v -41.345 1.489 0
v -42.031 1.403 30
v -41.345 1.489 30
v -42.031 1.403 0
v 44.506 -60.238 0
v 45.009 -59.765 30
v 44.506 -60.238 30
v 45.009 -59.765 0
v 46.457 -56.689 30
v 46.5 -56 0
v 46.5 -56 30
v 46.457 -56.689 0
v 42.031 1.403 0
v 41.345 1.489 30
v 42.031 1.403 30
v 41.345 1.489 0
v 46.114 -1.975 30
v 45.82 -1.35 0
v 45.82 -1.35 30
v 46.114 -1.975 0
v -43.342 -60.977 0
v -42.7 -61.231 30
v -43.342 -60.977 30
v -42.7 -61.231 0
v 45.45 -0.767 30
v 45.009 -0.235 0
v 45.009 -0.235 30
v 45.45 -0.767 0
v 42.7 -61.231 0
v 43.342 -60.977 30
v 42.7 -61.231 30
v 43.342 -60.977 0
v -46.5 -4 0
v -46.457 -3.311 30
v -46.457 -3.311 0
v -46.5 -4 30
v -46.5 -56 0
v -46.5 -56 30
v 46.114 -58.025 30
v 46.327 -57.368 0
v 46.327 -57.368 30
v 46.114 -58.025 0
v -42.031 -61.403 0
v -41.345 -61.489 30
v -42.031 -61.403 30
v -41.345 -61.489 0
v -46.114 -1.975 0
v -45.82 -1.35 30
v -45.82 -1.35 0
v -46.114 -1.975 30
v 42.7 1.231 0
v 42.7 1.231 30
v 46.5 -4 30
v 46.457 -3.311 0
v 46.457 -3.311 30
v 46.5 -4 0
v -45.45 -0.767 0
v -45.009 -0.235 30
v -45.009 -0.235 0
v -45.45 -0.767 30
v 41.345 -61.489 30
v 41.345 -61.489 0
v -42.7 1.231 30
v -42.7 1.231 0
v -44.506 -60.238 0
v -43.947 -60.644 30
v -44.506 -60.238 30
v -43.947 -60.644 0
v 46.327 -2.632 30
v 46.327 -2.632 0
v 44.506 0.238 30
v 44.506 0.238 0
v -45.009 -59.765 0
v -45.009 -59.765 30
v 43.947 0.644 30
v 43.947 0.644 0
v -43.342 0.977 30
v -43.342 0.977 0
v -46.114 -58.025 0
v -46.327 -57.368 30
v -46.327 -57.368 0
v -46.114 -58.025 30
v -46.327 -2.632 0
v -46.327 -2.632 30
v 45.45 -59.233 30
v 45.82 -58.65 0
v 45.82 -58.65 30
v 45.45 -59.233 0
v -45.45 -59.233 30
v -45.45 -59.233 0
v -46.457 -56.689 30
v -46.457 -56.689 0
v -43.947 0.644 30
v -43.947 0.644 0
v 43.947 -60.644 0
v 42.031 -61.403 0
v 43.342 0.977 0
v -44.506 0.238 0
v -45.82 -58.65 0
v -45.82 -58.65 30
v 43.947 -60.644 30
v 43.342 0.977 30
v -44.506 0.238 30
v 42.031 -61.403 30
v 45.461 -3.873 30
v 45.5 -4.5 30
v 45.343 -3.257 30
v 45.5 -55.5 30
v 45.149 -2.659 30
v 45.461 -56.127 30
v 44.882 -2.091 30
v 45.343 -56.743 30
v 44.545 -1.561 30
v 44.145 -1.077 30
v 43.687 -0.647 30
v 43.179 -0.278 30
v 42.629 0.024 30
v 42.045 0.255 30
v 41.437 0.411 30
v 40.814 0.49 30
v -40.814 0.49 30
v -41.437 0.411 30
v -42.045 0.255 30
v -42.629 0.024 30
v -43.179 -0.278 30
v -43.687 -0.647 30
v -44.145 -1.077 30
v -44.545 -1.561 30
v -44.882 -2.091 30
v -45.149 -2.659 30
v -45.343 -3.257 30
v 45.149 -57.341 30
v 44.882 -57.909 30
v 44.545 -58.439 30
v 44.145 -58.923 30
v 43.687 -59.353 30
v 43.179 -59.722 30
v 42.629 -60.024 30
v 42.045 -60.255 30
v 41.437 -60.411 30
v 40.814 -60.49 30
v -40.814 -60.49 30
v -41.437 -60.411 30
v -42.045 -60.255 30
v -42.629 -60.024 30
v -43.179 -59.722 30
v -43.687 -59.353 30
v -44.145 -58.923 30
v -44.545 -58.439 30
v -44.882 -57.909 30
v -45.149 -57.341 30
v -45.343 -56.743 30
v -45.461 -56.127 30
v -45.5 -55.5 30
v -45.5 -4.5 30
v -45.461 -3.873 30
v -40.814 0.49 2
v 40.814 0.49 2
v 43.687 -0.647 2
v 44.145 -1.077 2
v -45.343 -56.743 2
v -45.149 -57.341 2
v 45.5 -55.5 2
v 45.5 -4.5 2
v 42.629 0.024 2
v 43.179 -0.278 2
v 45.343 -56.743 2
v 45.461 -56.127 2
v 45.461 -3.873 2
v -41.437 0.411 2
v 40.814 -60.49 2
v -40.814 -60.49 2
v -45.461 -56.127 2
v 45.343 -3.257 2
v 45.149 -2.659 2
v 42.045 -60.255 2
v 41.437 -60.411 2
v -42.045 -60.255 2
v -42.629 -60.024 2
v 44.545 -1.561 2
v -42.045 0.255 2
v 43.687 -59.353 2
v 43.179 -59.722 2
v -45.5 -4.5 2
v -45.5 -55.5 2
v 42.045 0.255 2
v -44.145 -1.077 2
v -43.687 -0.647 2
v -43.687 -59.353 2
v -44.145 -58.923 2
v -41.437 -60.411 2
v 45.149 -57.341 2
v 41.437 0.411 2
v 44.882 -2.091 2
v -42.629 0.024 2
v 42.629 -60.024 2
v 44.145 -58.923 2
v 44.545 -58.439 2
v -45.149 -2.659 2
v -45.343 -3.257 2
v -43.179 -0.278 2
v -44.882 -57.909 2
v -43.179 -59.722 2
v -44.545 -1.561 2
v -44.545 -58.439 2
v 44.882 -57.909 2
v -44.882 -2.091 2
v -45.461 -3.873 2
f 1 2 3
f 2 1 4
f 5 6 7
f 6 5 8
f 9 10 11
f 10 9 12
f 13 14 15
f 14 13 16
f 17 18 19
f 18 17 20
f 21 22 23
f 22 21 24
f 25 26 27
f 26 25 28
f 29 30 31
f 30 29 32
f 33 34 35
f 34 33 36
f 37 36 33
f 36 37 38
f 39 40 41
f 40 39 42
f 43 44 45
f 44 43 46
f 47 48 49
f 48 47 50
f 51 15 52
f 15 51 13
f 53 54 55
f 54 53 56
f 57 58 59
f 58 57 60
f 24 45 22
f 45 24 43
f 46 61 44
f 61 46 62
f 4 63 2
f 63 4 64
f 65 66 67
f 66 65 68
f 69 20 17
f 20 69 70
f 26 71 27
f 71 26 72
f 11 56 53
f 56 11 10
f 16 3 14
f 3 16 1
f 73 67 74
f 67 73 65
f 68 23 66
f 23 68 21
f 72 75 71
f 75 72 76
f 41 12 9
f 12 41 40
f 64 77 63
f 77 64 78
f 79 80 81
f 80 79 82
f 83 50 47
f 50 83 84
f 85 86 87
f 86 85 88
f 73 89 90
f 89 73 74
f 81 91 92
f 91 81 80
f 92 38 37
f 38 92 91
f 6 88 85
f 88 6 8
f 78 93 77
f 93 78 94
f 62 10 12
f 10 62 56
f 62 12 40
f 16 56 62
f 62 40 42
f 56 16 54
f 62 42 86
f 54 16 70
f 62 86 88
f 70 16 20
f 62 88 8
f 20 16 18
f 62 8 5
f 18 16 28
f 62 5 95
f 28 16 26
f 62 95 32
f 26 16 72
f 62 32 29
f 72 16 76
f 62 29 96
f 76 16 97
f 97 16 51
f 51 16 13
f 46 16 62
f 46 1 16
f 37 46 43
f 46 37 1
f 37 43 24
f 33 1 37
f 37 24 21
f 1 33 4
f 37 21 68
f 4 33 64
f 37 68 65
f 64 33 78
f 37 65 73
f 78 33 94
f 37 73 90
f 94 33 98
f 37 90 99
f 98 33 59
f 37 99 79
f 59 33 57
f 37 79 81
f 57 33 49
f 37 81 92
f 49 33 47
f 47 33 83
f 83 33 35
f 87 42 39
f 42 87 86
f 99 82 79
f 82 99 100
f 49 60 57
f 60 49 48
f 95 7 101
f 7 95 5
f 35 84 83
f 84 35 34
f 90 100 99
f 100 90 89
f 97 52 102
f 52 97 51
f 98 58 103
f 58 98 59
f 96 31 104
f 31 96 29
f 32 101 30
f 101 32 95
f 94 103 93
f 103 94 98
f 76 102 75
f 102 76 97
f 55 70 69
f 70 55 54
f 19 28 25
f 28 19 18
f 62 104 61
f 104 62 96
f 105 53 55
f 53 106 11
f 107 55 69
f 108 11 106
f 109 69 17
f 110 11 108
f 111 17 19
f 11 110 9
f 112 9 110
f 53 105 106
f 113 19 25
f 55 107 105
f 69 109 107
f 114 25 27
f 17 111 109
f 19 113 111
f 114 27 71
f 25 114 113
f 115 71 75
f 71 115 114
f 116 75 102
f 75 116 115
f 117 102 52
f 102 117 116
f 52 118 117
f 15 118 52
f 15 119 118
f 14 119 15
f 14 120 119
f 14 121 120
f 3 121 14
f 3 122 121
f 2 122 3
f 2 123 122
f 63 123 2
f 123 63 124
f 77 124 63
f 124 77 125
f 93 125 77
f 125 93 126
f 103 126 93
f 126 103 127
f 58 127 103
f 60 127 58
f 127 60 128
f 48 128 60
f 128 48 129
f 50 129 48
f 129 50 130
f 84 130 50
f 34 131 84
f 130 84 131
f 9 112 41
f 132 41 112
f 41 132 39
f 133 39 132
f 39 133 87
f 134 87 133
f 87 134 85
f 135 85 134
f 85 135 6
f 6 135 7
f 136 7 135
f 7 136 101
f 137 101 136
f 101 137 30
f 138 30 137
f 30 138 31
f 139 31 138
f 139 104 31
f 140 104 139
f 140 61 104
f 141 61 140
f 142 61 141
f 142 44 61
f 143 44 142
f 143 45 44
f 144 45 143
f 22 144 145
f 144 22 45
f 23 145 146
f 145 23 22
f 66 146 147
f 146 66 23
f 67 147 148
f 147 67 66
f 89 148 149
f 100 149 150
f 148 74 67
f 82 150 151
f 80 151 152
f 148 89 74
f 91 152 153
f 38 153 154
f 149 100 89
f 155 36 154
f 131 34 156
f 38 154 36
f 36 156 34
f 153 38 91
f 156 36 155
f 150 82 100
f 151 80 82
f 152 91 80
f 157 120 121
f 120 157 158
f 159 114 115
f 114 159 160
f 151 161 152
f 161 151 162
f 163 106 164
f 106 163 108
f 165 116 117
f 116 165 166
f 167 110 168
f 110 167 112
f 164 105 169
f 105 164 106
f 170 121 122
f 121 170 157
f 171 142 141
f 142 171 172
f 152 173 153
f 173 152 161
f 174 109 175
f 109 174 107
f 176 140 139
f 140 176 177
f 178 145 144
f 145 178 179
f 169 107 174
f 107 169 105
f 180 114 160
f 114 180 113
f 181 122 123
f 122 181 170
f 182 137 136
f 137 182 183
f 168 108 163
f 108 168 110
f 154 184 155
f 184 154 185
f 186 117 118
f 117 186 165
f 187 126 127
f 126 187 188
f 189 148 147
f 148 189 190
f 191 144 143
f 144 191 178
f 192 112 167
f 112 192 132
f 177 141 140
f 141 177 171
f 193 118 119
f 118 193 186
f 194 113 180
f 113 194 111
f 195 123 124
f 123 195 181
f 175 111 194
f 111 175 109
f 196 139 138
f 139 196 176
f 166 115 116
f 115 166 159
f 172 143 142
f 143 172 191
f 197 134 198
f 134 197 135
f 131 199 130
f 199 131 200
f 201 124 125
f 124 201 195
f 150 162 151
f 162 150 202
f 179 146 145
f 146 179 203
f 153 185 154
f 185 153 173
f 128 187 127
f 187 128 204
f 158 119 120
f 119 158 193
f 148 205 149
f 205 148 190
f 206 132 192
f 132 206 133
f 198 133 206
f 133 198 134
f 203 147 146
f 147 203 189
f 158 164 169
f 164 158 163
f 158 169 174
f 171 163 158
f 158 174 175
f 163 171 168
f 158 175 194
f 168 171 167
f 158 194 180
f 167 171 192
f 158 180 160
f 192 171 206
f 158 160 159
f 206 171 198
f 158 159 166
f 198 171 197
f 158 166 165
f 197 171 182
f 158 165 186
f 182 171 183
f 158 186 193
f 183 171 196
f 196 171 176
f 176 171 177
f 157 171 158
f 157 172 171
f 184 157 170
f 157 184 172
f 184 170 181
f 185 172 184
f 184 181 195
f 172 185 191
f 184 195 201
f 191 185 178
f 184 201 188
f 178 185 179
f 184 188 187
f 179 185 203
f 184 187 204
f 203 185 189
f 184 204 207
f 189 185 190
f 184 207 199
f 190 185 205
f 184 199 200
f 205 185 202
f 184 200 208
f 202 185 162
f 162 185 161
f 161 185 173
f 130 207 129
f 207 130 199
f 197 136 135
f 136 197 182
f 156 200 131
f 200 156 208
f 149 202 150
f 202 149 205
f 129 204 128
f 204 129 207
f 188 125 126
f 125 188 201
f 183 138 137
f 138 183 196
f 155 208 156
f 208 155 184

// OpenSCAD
$fn = 50;


difference() {
	union() {
		translate(v = [0, -30.0000000000, 0]) {
			hull() {
				translate(v = [-41.0000000000, 26.0000000000, 0]) {
					cylinder(h = 30, r = 5.5000000000);
				}
				translate(v = [41.0000000000, 26.0000000000, 0]) {
					cylinder(h = 30, r = 5.5000000000);
				}
				translate(v = [-41.0000000000, -26.0000000000, 0]) {
					cylinder(h = 30, r = 5.5000000000);
				}
				translate(v = [41.0000000000, -26.0000000000, 0]) {
					cylinder(h = 30, r = 5.5000000000);
				}
			}
		}
	}
	union() {
		translate(v = [0, -30.0000000000, 2]) {
			hull() {
				translate(v = [-40.5000000000, 25.5000000000, 0]) {
					cylinder(h = 60, r = 5);
				}
				translate(v = [40.5000000000, 25.5000000000, 0]) {
					cylinder(h = 60, r = 5);
				}
				translate(v = [-40.5000000000, -25.5000000000, 0]) {
					cylinder(h = 60, r = 5);
				}
				translate(v = [40.5000000000, -25.5000000000, 0]) {
					cylinder(h = 60, r = 5);
				}
			}
		}
	}
}
